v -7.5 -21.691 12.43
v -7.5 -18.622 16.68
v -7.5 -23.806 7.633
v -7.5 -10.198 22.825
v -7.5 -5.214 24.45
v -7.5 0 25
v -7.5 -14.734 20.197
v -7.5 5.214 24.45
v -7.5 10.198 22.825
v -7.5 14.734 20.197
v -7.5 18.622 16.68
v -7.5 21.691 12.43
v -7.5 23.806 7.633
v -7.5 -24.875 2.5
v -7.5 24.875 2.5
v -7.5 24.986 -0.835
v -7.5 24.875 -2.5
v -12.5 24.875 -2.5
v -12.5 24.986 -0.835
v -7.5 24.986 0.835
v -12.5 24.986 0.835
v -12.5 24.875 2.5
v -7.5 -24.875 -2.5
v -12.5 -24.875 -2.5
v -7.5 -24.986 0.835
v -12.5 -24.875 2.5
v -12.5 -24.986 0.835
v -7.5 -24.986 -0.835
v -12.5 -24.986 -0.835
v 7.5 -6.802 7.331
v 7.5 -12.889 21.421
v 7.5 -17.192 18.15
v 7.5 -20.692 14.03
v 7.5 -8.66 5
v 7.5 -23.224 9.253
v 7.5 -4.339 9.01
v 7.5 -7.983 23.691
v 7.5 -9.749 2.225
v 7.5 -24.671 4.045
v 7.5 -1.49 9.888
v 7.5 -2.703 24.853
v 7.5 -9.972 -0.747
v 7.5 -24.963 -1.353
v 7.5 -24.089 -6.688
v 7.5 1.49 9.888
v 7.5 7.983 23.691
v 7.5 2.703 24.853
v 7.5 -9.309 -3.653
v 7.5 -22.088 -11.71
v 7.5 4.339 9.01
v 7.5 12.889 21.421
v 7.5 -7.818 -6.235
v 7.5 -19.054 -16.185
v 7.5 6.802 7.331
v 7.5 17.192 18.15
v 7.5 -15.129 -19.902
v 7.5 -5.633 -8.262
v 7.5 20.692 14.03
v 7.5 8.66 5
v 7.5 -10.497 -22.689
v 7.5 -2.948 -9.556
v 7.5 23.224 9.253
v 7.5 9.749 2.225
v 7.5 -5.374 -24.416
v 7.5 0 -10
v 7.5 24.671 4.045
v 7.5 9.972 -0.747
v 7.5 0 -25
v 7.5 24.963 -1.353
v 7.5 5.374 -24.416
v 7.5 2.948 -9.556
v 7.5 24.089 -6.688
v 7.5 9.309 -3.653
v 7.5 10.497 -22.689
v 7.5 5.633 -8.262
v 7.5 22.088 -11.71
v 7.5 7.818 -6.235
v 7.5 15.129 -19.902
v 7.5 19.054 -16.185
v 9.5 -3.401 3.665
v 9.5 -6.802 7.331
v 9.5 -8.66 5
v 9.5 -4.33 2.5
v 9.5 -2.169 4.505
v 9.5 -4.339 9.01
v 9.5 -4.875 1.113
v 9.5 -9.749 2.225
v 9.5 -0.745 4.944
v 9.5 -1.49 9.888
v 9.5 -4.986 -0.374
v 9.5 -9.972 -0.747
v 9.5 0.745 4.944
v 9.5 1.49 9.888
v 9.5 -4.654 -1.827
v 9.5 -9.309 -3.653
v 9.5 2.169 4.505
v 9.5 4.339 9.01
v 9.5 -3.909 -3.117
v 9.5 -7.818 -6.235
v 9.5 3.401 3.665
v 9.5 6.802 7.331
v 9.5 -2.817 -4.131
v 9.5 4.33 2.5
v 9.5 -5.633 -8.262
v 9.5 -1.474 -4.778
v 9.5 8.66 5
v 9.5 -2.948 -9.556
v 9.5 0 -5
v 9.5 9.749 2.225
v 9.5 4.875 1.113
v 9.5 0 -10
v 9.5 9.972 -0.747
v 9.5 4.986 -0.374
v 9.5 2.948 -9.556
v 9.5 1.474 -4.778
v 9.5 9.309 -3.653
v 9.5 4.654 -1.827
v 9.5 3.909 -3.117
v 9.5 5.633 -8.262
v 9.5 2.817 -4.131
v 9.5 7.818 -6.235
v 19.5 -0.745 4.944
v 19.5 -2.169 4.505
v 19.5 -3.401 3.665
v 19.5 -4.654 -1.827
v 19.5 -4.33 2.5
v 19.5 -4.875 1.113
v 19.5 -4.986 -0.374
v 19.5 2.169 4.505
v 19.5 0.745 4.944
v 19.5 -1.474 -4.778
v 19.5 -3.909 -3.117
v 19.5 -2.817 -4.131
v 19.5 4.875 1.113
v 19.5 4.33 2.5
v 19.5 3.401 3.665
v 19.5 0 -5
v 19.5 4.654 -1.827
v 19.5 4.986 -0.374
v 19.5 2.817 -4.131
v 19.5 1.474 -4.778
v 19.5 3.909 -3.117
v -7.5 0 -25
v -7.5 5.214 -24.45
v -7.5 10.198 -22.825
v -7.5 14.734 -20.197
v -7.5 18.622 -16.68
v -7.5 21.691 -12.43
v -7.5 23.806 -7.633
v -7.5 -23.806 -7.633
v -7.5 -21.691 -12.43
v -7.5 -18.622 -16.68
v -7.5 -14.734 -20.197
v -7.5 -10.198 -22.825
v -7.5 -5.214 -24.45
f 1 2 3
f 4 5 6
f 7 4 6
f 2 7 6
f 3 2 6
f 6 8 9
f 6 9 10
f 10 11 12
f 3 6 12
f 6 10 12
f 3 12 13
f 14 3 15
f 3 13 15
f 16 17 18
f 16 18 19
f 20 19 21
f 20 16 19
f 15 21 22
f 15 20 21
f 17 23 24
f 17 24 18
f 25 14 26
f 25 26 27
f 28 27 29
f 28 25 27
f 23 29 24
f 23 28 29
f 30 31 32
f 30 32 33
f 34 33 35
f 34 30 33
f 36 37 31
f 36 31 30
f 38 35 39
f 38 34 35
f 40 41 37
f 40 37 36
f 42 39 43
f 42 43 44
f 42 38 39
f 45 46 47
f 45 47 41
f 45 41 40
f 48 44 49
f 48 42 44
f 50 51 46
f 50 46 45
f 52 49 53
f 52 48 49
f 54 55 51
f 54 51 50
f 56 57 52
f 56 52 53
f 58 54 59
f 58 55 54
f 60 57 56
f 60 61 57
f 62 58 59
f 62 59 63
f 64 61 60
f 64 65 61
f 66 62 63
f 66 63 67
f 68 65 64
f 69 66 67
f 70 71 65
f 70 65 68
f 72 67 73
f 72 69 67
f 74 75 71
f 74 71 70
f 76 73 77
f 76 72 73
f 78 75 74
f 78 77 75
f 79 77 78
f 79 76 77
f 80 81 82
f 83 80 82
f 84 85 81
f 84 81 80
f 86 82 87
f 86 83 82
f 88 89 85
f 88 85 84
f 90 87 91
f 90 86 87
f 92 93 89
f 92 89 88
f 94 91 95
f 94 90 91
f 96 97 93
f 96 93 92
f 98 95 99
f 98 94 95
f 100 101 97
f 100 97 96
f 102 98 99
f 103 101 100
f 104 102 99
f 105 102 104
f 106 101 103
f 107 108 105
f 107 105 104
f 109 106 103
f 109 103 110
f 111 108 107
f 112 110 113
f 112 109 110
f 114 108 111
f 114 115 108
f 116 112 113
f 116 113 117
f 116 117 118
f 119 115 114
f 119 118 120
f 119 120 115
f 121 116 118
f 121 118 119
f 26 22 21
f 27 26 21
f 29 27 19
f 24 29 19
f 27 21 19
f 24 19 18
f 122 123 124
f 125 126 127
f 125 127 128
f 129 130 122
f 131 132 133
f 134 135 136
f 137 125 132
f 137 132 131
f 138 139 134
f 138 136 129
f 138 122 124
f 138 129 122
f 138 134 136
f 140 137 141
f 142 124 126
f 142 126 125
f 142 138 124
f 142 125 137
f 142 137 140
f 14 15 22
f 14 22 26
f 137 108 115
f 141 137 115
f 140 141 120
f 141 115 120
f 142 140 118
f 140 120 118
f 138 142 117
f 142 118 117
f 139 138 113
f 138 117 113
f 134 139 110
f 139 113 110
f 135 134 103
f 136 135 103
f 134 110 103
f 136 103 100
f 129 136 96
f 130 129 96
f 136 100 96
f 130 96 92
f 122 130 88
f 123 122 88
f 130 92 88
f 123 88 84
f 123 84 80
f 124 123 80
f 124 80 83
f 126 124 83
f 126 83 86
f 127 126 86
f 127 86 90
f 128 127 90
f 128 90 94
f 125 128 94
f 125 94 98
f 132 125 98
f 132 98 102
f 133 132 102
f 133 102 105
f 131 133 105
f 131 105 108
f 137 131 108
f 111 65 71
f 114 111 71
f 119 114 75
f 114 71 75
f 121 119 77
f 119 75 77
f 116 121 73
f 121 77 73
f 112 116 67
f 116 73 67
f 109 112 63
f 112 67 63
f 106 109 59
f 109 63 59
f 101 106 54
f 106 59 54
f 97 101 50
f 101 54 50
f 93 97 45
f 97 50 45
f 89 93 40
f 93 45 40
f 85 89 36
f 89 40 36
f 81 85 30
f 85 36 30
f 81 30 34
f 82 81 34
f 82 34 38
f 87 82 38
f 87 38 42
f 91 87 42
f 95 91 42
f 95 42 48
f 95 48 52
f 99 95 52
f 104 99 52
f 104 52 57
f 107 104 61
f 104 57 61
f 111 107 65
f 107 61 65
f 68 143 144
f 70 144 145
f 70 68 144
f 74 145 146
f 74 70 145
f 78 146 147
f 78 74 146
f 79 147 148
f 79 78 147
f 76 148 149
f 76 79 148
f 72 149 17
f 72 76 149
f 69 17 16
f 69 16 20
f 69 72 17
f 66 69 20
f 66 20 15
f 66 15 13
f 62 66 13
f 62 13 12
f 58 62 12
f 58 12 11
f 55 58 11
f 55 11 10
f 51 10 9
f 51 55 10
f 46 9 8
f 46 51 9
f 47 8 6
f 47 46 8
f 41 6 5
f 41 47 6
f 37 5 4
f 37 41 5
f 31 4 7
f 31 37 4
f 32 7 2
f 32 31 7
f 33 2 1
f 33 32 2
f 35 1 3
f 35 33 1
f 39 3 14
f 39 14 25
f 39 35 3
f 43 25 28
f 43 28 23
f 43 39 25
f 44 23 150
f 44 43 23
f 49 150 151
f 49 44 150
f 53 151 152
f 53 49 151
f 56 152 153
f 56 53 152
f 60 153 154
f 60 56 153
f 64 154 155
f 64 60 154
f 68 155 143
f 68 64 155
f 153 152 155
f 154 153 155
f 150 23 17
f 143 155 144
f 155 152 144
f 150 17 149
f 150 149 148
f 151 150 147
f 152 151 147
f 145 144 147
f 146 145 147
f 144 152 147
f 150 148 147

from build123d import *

# Parameters (mm, degrees)
SKETCH1_R           = 25
BOSS_EXTRUDE1_DEPTH = 7.5
SKETCH2_R           = 5
BOSS_EXTRUDE2_DEPTH = 12
BOSS_EXTRUDE3_DEPTH = 5
SKETCH4_R           = 10
BOSS_EXTRUDE4_DEPTH = 2


with BuildPart() as part:
    # Sketch1 → Boss-Extrude1 (new, symmetric)
    with BuildSketch(Plane(origin=(0, 0, 0), x_dir=(0, 0, -1), z_dir=(1, 0, 0))):
        Circle(SKETCH1_R)
    extrude(amount=BOSS_EXTRUDE1_DEPTH, both=True)

    # Sketch2 → Boss-Extrude2 (add)
    with BuildSketch(Plane(origin=(7.5, 0, 0), x_dir=(0, 0, -1), z_dir=(1, 0, 0))):
        Circle(SKETCH2_R)
    extrude(amount=BOSS_EXTRUDE2_DEPTH)

    # Sketch3 → Boss-Extrude3 (add)
    with BuildSketch(Plane.ZY.offset(7.5)):
        with BuildLine():
            Line((2.5, 24.874685928), (2.5, -24.874685928))
            ThreePointArc((2.5, -24.874685928), (0, -25), (-2.5, -24.874685928))
            Line((-2.5, -24.874685928), (-2.5, 24.874685928))
            ThreePointArc((-2.5, 24.874685928), (0, 25), (2.5, 24.874685928))
        make_face()
    extrude(amount=BOSS_EXTRUDE3_DEPTH)

    # Sketch4 → Boss-Extrude4 (add)
    with BuildSketch(Plane(origin=(7.5, 0, 0), x_dir=(0, 0, -1), z_dir=(1, 0, 0))):
        Circle(SKETCH4_R)
    extrude(amount=BOSS_EXTRUDE4_DEPTH)


solid = part.part
